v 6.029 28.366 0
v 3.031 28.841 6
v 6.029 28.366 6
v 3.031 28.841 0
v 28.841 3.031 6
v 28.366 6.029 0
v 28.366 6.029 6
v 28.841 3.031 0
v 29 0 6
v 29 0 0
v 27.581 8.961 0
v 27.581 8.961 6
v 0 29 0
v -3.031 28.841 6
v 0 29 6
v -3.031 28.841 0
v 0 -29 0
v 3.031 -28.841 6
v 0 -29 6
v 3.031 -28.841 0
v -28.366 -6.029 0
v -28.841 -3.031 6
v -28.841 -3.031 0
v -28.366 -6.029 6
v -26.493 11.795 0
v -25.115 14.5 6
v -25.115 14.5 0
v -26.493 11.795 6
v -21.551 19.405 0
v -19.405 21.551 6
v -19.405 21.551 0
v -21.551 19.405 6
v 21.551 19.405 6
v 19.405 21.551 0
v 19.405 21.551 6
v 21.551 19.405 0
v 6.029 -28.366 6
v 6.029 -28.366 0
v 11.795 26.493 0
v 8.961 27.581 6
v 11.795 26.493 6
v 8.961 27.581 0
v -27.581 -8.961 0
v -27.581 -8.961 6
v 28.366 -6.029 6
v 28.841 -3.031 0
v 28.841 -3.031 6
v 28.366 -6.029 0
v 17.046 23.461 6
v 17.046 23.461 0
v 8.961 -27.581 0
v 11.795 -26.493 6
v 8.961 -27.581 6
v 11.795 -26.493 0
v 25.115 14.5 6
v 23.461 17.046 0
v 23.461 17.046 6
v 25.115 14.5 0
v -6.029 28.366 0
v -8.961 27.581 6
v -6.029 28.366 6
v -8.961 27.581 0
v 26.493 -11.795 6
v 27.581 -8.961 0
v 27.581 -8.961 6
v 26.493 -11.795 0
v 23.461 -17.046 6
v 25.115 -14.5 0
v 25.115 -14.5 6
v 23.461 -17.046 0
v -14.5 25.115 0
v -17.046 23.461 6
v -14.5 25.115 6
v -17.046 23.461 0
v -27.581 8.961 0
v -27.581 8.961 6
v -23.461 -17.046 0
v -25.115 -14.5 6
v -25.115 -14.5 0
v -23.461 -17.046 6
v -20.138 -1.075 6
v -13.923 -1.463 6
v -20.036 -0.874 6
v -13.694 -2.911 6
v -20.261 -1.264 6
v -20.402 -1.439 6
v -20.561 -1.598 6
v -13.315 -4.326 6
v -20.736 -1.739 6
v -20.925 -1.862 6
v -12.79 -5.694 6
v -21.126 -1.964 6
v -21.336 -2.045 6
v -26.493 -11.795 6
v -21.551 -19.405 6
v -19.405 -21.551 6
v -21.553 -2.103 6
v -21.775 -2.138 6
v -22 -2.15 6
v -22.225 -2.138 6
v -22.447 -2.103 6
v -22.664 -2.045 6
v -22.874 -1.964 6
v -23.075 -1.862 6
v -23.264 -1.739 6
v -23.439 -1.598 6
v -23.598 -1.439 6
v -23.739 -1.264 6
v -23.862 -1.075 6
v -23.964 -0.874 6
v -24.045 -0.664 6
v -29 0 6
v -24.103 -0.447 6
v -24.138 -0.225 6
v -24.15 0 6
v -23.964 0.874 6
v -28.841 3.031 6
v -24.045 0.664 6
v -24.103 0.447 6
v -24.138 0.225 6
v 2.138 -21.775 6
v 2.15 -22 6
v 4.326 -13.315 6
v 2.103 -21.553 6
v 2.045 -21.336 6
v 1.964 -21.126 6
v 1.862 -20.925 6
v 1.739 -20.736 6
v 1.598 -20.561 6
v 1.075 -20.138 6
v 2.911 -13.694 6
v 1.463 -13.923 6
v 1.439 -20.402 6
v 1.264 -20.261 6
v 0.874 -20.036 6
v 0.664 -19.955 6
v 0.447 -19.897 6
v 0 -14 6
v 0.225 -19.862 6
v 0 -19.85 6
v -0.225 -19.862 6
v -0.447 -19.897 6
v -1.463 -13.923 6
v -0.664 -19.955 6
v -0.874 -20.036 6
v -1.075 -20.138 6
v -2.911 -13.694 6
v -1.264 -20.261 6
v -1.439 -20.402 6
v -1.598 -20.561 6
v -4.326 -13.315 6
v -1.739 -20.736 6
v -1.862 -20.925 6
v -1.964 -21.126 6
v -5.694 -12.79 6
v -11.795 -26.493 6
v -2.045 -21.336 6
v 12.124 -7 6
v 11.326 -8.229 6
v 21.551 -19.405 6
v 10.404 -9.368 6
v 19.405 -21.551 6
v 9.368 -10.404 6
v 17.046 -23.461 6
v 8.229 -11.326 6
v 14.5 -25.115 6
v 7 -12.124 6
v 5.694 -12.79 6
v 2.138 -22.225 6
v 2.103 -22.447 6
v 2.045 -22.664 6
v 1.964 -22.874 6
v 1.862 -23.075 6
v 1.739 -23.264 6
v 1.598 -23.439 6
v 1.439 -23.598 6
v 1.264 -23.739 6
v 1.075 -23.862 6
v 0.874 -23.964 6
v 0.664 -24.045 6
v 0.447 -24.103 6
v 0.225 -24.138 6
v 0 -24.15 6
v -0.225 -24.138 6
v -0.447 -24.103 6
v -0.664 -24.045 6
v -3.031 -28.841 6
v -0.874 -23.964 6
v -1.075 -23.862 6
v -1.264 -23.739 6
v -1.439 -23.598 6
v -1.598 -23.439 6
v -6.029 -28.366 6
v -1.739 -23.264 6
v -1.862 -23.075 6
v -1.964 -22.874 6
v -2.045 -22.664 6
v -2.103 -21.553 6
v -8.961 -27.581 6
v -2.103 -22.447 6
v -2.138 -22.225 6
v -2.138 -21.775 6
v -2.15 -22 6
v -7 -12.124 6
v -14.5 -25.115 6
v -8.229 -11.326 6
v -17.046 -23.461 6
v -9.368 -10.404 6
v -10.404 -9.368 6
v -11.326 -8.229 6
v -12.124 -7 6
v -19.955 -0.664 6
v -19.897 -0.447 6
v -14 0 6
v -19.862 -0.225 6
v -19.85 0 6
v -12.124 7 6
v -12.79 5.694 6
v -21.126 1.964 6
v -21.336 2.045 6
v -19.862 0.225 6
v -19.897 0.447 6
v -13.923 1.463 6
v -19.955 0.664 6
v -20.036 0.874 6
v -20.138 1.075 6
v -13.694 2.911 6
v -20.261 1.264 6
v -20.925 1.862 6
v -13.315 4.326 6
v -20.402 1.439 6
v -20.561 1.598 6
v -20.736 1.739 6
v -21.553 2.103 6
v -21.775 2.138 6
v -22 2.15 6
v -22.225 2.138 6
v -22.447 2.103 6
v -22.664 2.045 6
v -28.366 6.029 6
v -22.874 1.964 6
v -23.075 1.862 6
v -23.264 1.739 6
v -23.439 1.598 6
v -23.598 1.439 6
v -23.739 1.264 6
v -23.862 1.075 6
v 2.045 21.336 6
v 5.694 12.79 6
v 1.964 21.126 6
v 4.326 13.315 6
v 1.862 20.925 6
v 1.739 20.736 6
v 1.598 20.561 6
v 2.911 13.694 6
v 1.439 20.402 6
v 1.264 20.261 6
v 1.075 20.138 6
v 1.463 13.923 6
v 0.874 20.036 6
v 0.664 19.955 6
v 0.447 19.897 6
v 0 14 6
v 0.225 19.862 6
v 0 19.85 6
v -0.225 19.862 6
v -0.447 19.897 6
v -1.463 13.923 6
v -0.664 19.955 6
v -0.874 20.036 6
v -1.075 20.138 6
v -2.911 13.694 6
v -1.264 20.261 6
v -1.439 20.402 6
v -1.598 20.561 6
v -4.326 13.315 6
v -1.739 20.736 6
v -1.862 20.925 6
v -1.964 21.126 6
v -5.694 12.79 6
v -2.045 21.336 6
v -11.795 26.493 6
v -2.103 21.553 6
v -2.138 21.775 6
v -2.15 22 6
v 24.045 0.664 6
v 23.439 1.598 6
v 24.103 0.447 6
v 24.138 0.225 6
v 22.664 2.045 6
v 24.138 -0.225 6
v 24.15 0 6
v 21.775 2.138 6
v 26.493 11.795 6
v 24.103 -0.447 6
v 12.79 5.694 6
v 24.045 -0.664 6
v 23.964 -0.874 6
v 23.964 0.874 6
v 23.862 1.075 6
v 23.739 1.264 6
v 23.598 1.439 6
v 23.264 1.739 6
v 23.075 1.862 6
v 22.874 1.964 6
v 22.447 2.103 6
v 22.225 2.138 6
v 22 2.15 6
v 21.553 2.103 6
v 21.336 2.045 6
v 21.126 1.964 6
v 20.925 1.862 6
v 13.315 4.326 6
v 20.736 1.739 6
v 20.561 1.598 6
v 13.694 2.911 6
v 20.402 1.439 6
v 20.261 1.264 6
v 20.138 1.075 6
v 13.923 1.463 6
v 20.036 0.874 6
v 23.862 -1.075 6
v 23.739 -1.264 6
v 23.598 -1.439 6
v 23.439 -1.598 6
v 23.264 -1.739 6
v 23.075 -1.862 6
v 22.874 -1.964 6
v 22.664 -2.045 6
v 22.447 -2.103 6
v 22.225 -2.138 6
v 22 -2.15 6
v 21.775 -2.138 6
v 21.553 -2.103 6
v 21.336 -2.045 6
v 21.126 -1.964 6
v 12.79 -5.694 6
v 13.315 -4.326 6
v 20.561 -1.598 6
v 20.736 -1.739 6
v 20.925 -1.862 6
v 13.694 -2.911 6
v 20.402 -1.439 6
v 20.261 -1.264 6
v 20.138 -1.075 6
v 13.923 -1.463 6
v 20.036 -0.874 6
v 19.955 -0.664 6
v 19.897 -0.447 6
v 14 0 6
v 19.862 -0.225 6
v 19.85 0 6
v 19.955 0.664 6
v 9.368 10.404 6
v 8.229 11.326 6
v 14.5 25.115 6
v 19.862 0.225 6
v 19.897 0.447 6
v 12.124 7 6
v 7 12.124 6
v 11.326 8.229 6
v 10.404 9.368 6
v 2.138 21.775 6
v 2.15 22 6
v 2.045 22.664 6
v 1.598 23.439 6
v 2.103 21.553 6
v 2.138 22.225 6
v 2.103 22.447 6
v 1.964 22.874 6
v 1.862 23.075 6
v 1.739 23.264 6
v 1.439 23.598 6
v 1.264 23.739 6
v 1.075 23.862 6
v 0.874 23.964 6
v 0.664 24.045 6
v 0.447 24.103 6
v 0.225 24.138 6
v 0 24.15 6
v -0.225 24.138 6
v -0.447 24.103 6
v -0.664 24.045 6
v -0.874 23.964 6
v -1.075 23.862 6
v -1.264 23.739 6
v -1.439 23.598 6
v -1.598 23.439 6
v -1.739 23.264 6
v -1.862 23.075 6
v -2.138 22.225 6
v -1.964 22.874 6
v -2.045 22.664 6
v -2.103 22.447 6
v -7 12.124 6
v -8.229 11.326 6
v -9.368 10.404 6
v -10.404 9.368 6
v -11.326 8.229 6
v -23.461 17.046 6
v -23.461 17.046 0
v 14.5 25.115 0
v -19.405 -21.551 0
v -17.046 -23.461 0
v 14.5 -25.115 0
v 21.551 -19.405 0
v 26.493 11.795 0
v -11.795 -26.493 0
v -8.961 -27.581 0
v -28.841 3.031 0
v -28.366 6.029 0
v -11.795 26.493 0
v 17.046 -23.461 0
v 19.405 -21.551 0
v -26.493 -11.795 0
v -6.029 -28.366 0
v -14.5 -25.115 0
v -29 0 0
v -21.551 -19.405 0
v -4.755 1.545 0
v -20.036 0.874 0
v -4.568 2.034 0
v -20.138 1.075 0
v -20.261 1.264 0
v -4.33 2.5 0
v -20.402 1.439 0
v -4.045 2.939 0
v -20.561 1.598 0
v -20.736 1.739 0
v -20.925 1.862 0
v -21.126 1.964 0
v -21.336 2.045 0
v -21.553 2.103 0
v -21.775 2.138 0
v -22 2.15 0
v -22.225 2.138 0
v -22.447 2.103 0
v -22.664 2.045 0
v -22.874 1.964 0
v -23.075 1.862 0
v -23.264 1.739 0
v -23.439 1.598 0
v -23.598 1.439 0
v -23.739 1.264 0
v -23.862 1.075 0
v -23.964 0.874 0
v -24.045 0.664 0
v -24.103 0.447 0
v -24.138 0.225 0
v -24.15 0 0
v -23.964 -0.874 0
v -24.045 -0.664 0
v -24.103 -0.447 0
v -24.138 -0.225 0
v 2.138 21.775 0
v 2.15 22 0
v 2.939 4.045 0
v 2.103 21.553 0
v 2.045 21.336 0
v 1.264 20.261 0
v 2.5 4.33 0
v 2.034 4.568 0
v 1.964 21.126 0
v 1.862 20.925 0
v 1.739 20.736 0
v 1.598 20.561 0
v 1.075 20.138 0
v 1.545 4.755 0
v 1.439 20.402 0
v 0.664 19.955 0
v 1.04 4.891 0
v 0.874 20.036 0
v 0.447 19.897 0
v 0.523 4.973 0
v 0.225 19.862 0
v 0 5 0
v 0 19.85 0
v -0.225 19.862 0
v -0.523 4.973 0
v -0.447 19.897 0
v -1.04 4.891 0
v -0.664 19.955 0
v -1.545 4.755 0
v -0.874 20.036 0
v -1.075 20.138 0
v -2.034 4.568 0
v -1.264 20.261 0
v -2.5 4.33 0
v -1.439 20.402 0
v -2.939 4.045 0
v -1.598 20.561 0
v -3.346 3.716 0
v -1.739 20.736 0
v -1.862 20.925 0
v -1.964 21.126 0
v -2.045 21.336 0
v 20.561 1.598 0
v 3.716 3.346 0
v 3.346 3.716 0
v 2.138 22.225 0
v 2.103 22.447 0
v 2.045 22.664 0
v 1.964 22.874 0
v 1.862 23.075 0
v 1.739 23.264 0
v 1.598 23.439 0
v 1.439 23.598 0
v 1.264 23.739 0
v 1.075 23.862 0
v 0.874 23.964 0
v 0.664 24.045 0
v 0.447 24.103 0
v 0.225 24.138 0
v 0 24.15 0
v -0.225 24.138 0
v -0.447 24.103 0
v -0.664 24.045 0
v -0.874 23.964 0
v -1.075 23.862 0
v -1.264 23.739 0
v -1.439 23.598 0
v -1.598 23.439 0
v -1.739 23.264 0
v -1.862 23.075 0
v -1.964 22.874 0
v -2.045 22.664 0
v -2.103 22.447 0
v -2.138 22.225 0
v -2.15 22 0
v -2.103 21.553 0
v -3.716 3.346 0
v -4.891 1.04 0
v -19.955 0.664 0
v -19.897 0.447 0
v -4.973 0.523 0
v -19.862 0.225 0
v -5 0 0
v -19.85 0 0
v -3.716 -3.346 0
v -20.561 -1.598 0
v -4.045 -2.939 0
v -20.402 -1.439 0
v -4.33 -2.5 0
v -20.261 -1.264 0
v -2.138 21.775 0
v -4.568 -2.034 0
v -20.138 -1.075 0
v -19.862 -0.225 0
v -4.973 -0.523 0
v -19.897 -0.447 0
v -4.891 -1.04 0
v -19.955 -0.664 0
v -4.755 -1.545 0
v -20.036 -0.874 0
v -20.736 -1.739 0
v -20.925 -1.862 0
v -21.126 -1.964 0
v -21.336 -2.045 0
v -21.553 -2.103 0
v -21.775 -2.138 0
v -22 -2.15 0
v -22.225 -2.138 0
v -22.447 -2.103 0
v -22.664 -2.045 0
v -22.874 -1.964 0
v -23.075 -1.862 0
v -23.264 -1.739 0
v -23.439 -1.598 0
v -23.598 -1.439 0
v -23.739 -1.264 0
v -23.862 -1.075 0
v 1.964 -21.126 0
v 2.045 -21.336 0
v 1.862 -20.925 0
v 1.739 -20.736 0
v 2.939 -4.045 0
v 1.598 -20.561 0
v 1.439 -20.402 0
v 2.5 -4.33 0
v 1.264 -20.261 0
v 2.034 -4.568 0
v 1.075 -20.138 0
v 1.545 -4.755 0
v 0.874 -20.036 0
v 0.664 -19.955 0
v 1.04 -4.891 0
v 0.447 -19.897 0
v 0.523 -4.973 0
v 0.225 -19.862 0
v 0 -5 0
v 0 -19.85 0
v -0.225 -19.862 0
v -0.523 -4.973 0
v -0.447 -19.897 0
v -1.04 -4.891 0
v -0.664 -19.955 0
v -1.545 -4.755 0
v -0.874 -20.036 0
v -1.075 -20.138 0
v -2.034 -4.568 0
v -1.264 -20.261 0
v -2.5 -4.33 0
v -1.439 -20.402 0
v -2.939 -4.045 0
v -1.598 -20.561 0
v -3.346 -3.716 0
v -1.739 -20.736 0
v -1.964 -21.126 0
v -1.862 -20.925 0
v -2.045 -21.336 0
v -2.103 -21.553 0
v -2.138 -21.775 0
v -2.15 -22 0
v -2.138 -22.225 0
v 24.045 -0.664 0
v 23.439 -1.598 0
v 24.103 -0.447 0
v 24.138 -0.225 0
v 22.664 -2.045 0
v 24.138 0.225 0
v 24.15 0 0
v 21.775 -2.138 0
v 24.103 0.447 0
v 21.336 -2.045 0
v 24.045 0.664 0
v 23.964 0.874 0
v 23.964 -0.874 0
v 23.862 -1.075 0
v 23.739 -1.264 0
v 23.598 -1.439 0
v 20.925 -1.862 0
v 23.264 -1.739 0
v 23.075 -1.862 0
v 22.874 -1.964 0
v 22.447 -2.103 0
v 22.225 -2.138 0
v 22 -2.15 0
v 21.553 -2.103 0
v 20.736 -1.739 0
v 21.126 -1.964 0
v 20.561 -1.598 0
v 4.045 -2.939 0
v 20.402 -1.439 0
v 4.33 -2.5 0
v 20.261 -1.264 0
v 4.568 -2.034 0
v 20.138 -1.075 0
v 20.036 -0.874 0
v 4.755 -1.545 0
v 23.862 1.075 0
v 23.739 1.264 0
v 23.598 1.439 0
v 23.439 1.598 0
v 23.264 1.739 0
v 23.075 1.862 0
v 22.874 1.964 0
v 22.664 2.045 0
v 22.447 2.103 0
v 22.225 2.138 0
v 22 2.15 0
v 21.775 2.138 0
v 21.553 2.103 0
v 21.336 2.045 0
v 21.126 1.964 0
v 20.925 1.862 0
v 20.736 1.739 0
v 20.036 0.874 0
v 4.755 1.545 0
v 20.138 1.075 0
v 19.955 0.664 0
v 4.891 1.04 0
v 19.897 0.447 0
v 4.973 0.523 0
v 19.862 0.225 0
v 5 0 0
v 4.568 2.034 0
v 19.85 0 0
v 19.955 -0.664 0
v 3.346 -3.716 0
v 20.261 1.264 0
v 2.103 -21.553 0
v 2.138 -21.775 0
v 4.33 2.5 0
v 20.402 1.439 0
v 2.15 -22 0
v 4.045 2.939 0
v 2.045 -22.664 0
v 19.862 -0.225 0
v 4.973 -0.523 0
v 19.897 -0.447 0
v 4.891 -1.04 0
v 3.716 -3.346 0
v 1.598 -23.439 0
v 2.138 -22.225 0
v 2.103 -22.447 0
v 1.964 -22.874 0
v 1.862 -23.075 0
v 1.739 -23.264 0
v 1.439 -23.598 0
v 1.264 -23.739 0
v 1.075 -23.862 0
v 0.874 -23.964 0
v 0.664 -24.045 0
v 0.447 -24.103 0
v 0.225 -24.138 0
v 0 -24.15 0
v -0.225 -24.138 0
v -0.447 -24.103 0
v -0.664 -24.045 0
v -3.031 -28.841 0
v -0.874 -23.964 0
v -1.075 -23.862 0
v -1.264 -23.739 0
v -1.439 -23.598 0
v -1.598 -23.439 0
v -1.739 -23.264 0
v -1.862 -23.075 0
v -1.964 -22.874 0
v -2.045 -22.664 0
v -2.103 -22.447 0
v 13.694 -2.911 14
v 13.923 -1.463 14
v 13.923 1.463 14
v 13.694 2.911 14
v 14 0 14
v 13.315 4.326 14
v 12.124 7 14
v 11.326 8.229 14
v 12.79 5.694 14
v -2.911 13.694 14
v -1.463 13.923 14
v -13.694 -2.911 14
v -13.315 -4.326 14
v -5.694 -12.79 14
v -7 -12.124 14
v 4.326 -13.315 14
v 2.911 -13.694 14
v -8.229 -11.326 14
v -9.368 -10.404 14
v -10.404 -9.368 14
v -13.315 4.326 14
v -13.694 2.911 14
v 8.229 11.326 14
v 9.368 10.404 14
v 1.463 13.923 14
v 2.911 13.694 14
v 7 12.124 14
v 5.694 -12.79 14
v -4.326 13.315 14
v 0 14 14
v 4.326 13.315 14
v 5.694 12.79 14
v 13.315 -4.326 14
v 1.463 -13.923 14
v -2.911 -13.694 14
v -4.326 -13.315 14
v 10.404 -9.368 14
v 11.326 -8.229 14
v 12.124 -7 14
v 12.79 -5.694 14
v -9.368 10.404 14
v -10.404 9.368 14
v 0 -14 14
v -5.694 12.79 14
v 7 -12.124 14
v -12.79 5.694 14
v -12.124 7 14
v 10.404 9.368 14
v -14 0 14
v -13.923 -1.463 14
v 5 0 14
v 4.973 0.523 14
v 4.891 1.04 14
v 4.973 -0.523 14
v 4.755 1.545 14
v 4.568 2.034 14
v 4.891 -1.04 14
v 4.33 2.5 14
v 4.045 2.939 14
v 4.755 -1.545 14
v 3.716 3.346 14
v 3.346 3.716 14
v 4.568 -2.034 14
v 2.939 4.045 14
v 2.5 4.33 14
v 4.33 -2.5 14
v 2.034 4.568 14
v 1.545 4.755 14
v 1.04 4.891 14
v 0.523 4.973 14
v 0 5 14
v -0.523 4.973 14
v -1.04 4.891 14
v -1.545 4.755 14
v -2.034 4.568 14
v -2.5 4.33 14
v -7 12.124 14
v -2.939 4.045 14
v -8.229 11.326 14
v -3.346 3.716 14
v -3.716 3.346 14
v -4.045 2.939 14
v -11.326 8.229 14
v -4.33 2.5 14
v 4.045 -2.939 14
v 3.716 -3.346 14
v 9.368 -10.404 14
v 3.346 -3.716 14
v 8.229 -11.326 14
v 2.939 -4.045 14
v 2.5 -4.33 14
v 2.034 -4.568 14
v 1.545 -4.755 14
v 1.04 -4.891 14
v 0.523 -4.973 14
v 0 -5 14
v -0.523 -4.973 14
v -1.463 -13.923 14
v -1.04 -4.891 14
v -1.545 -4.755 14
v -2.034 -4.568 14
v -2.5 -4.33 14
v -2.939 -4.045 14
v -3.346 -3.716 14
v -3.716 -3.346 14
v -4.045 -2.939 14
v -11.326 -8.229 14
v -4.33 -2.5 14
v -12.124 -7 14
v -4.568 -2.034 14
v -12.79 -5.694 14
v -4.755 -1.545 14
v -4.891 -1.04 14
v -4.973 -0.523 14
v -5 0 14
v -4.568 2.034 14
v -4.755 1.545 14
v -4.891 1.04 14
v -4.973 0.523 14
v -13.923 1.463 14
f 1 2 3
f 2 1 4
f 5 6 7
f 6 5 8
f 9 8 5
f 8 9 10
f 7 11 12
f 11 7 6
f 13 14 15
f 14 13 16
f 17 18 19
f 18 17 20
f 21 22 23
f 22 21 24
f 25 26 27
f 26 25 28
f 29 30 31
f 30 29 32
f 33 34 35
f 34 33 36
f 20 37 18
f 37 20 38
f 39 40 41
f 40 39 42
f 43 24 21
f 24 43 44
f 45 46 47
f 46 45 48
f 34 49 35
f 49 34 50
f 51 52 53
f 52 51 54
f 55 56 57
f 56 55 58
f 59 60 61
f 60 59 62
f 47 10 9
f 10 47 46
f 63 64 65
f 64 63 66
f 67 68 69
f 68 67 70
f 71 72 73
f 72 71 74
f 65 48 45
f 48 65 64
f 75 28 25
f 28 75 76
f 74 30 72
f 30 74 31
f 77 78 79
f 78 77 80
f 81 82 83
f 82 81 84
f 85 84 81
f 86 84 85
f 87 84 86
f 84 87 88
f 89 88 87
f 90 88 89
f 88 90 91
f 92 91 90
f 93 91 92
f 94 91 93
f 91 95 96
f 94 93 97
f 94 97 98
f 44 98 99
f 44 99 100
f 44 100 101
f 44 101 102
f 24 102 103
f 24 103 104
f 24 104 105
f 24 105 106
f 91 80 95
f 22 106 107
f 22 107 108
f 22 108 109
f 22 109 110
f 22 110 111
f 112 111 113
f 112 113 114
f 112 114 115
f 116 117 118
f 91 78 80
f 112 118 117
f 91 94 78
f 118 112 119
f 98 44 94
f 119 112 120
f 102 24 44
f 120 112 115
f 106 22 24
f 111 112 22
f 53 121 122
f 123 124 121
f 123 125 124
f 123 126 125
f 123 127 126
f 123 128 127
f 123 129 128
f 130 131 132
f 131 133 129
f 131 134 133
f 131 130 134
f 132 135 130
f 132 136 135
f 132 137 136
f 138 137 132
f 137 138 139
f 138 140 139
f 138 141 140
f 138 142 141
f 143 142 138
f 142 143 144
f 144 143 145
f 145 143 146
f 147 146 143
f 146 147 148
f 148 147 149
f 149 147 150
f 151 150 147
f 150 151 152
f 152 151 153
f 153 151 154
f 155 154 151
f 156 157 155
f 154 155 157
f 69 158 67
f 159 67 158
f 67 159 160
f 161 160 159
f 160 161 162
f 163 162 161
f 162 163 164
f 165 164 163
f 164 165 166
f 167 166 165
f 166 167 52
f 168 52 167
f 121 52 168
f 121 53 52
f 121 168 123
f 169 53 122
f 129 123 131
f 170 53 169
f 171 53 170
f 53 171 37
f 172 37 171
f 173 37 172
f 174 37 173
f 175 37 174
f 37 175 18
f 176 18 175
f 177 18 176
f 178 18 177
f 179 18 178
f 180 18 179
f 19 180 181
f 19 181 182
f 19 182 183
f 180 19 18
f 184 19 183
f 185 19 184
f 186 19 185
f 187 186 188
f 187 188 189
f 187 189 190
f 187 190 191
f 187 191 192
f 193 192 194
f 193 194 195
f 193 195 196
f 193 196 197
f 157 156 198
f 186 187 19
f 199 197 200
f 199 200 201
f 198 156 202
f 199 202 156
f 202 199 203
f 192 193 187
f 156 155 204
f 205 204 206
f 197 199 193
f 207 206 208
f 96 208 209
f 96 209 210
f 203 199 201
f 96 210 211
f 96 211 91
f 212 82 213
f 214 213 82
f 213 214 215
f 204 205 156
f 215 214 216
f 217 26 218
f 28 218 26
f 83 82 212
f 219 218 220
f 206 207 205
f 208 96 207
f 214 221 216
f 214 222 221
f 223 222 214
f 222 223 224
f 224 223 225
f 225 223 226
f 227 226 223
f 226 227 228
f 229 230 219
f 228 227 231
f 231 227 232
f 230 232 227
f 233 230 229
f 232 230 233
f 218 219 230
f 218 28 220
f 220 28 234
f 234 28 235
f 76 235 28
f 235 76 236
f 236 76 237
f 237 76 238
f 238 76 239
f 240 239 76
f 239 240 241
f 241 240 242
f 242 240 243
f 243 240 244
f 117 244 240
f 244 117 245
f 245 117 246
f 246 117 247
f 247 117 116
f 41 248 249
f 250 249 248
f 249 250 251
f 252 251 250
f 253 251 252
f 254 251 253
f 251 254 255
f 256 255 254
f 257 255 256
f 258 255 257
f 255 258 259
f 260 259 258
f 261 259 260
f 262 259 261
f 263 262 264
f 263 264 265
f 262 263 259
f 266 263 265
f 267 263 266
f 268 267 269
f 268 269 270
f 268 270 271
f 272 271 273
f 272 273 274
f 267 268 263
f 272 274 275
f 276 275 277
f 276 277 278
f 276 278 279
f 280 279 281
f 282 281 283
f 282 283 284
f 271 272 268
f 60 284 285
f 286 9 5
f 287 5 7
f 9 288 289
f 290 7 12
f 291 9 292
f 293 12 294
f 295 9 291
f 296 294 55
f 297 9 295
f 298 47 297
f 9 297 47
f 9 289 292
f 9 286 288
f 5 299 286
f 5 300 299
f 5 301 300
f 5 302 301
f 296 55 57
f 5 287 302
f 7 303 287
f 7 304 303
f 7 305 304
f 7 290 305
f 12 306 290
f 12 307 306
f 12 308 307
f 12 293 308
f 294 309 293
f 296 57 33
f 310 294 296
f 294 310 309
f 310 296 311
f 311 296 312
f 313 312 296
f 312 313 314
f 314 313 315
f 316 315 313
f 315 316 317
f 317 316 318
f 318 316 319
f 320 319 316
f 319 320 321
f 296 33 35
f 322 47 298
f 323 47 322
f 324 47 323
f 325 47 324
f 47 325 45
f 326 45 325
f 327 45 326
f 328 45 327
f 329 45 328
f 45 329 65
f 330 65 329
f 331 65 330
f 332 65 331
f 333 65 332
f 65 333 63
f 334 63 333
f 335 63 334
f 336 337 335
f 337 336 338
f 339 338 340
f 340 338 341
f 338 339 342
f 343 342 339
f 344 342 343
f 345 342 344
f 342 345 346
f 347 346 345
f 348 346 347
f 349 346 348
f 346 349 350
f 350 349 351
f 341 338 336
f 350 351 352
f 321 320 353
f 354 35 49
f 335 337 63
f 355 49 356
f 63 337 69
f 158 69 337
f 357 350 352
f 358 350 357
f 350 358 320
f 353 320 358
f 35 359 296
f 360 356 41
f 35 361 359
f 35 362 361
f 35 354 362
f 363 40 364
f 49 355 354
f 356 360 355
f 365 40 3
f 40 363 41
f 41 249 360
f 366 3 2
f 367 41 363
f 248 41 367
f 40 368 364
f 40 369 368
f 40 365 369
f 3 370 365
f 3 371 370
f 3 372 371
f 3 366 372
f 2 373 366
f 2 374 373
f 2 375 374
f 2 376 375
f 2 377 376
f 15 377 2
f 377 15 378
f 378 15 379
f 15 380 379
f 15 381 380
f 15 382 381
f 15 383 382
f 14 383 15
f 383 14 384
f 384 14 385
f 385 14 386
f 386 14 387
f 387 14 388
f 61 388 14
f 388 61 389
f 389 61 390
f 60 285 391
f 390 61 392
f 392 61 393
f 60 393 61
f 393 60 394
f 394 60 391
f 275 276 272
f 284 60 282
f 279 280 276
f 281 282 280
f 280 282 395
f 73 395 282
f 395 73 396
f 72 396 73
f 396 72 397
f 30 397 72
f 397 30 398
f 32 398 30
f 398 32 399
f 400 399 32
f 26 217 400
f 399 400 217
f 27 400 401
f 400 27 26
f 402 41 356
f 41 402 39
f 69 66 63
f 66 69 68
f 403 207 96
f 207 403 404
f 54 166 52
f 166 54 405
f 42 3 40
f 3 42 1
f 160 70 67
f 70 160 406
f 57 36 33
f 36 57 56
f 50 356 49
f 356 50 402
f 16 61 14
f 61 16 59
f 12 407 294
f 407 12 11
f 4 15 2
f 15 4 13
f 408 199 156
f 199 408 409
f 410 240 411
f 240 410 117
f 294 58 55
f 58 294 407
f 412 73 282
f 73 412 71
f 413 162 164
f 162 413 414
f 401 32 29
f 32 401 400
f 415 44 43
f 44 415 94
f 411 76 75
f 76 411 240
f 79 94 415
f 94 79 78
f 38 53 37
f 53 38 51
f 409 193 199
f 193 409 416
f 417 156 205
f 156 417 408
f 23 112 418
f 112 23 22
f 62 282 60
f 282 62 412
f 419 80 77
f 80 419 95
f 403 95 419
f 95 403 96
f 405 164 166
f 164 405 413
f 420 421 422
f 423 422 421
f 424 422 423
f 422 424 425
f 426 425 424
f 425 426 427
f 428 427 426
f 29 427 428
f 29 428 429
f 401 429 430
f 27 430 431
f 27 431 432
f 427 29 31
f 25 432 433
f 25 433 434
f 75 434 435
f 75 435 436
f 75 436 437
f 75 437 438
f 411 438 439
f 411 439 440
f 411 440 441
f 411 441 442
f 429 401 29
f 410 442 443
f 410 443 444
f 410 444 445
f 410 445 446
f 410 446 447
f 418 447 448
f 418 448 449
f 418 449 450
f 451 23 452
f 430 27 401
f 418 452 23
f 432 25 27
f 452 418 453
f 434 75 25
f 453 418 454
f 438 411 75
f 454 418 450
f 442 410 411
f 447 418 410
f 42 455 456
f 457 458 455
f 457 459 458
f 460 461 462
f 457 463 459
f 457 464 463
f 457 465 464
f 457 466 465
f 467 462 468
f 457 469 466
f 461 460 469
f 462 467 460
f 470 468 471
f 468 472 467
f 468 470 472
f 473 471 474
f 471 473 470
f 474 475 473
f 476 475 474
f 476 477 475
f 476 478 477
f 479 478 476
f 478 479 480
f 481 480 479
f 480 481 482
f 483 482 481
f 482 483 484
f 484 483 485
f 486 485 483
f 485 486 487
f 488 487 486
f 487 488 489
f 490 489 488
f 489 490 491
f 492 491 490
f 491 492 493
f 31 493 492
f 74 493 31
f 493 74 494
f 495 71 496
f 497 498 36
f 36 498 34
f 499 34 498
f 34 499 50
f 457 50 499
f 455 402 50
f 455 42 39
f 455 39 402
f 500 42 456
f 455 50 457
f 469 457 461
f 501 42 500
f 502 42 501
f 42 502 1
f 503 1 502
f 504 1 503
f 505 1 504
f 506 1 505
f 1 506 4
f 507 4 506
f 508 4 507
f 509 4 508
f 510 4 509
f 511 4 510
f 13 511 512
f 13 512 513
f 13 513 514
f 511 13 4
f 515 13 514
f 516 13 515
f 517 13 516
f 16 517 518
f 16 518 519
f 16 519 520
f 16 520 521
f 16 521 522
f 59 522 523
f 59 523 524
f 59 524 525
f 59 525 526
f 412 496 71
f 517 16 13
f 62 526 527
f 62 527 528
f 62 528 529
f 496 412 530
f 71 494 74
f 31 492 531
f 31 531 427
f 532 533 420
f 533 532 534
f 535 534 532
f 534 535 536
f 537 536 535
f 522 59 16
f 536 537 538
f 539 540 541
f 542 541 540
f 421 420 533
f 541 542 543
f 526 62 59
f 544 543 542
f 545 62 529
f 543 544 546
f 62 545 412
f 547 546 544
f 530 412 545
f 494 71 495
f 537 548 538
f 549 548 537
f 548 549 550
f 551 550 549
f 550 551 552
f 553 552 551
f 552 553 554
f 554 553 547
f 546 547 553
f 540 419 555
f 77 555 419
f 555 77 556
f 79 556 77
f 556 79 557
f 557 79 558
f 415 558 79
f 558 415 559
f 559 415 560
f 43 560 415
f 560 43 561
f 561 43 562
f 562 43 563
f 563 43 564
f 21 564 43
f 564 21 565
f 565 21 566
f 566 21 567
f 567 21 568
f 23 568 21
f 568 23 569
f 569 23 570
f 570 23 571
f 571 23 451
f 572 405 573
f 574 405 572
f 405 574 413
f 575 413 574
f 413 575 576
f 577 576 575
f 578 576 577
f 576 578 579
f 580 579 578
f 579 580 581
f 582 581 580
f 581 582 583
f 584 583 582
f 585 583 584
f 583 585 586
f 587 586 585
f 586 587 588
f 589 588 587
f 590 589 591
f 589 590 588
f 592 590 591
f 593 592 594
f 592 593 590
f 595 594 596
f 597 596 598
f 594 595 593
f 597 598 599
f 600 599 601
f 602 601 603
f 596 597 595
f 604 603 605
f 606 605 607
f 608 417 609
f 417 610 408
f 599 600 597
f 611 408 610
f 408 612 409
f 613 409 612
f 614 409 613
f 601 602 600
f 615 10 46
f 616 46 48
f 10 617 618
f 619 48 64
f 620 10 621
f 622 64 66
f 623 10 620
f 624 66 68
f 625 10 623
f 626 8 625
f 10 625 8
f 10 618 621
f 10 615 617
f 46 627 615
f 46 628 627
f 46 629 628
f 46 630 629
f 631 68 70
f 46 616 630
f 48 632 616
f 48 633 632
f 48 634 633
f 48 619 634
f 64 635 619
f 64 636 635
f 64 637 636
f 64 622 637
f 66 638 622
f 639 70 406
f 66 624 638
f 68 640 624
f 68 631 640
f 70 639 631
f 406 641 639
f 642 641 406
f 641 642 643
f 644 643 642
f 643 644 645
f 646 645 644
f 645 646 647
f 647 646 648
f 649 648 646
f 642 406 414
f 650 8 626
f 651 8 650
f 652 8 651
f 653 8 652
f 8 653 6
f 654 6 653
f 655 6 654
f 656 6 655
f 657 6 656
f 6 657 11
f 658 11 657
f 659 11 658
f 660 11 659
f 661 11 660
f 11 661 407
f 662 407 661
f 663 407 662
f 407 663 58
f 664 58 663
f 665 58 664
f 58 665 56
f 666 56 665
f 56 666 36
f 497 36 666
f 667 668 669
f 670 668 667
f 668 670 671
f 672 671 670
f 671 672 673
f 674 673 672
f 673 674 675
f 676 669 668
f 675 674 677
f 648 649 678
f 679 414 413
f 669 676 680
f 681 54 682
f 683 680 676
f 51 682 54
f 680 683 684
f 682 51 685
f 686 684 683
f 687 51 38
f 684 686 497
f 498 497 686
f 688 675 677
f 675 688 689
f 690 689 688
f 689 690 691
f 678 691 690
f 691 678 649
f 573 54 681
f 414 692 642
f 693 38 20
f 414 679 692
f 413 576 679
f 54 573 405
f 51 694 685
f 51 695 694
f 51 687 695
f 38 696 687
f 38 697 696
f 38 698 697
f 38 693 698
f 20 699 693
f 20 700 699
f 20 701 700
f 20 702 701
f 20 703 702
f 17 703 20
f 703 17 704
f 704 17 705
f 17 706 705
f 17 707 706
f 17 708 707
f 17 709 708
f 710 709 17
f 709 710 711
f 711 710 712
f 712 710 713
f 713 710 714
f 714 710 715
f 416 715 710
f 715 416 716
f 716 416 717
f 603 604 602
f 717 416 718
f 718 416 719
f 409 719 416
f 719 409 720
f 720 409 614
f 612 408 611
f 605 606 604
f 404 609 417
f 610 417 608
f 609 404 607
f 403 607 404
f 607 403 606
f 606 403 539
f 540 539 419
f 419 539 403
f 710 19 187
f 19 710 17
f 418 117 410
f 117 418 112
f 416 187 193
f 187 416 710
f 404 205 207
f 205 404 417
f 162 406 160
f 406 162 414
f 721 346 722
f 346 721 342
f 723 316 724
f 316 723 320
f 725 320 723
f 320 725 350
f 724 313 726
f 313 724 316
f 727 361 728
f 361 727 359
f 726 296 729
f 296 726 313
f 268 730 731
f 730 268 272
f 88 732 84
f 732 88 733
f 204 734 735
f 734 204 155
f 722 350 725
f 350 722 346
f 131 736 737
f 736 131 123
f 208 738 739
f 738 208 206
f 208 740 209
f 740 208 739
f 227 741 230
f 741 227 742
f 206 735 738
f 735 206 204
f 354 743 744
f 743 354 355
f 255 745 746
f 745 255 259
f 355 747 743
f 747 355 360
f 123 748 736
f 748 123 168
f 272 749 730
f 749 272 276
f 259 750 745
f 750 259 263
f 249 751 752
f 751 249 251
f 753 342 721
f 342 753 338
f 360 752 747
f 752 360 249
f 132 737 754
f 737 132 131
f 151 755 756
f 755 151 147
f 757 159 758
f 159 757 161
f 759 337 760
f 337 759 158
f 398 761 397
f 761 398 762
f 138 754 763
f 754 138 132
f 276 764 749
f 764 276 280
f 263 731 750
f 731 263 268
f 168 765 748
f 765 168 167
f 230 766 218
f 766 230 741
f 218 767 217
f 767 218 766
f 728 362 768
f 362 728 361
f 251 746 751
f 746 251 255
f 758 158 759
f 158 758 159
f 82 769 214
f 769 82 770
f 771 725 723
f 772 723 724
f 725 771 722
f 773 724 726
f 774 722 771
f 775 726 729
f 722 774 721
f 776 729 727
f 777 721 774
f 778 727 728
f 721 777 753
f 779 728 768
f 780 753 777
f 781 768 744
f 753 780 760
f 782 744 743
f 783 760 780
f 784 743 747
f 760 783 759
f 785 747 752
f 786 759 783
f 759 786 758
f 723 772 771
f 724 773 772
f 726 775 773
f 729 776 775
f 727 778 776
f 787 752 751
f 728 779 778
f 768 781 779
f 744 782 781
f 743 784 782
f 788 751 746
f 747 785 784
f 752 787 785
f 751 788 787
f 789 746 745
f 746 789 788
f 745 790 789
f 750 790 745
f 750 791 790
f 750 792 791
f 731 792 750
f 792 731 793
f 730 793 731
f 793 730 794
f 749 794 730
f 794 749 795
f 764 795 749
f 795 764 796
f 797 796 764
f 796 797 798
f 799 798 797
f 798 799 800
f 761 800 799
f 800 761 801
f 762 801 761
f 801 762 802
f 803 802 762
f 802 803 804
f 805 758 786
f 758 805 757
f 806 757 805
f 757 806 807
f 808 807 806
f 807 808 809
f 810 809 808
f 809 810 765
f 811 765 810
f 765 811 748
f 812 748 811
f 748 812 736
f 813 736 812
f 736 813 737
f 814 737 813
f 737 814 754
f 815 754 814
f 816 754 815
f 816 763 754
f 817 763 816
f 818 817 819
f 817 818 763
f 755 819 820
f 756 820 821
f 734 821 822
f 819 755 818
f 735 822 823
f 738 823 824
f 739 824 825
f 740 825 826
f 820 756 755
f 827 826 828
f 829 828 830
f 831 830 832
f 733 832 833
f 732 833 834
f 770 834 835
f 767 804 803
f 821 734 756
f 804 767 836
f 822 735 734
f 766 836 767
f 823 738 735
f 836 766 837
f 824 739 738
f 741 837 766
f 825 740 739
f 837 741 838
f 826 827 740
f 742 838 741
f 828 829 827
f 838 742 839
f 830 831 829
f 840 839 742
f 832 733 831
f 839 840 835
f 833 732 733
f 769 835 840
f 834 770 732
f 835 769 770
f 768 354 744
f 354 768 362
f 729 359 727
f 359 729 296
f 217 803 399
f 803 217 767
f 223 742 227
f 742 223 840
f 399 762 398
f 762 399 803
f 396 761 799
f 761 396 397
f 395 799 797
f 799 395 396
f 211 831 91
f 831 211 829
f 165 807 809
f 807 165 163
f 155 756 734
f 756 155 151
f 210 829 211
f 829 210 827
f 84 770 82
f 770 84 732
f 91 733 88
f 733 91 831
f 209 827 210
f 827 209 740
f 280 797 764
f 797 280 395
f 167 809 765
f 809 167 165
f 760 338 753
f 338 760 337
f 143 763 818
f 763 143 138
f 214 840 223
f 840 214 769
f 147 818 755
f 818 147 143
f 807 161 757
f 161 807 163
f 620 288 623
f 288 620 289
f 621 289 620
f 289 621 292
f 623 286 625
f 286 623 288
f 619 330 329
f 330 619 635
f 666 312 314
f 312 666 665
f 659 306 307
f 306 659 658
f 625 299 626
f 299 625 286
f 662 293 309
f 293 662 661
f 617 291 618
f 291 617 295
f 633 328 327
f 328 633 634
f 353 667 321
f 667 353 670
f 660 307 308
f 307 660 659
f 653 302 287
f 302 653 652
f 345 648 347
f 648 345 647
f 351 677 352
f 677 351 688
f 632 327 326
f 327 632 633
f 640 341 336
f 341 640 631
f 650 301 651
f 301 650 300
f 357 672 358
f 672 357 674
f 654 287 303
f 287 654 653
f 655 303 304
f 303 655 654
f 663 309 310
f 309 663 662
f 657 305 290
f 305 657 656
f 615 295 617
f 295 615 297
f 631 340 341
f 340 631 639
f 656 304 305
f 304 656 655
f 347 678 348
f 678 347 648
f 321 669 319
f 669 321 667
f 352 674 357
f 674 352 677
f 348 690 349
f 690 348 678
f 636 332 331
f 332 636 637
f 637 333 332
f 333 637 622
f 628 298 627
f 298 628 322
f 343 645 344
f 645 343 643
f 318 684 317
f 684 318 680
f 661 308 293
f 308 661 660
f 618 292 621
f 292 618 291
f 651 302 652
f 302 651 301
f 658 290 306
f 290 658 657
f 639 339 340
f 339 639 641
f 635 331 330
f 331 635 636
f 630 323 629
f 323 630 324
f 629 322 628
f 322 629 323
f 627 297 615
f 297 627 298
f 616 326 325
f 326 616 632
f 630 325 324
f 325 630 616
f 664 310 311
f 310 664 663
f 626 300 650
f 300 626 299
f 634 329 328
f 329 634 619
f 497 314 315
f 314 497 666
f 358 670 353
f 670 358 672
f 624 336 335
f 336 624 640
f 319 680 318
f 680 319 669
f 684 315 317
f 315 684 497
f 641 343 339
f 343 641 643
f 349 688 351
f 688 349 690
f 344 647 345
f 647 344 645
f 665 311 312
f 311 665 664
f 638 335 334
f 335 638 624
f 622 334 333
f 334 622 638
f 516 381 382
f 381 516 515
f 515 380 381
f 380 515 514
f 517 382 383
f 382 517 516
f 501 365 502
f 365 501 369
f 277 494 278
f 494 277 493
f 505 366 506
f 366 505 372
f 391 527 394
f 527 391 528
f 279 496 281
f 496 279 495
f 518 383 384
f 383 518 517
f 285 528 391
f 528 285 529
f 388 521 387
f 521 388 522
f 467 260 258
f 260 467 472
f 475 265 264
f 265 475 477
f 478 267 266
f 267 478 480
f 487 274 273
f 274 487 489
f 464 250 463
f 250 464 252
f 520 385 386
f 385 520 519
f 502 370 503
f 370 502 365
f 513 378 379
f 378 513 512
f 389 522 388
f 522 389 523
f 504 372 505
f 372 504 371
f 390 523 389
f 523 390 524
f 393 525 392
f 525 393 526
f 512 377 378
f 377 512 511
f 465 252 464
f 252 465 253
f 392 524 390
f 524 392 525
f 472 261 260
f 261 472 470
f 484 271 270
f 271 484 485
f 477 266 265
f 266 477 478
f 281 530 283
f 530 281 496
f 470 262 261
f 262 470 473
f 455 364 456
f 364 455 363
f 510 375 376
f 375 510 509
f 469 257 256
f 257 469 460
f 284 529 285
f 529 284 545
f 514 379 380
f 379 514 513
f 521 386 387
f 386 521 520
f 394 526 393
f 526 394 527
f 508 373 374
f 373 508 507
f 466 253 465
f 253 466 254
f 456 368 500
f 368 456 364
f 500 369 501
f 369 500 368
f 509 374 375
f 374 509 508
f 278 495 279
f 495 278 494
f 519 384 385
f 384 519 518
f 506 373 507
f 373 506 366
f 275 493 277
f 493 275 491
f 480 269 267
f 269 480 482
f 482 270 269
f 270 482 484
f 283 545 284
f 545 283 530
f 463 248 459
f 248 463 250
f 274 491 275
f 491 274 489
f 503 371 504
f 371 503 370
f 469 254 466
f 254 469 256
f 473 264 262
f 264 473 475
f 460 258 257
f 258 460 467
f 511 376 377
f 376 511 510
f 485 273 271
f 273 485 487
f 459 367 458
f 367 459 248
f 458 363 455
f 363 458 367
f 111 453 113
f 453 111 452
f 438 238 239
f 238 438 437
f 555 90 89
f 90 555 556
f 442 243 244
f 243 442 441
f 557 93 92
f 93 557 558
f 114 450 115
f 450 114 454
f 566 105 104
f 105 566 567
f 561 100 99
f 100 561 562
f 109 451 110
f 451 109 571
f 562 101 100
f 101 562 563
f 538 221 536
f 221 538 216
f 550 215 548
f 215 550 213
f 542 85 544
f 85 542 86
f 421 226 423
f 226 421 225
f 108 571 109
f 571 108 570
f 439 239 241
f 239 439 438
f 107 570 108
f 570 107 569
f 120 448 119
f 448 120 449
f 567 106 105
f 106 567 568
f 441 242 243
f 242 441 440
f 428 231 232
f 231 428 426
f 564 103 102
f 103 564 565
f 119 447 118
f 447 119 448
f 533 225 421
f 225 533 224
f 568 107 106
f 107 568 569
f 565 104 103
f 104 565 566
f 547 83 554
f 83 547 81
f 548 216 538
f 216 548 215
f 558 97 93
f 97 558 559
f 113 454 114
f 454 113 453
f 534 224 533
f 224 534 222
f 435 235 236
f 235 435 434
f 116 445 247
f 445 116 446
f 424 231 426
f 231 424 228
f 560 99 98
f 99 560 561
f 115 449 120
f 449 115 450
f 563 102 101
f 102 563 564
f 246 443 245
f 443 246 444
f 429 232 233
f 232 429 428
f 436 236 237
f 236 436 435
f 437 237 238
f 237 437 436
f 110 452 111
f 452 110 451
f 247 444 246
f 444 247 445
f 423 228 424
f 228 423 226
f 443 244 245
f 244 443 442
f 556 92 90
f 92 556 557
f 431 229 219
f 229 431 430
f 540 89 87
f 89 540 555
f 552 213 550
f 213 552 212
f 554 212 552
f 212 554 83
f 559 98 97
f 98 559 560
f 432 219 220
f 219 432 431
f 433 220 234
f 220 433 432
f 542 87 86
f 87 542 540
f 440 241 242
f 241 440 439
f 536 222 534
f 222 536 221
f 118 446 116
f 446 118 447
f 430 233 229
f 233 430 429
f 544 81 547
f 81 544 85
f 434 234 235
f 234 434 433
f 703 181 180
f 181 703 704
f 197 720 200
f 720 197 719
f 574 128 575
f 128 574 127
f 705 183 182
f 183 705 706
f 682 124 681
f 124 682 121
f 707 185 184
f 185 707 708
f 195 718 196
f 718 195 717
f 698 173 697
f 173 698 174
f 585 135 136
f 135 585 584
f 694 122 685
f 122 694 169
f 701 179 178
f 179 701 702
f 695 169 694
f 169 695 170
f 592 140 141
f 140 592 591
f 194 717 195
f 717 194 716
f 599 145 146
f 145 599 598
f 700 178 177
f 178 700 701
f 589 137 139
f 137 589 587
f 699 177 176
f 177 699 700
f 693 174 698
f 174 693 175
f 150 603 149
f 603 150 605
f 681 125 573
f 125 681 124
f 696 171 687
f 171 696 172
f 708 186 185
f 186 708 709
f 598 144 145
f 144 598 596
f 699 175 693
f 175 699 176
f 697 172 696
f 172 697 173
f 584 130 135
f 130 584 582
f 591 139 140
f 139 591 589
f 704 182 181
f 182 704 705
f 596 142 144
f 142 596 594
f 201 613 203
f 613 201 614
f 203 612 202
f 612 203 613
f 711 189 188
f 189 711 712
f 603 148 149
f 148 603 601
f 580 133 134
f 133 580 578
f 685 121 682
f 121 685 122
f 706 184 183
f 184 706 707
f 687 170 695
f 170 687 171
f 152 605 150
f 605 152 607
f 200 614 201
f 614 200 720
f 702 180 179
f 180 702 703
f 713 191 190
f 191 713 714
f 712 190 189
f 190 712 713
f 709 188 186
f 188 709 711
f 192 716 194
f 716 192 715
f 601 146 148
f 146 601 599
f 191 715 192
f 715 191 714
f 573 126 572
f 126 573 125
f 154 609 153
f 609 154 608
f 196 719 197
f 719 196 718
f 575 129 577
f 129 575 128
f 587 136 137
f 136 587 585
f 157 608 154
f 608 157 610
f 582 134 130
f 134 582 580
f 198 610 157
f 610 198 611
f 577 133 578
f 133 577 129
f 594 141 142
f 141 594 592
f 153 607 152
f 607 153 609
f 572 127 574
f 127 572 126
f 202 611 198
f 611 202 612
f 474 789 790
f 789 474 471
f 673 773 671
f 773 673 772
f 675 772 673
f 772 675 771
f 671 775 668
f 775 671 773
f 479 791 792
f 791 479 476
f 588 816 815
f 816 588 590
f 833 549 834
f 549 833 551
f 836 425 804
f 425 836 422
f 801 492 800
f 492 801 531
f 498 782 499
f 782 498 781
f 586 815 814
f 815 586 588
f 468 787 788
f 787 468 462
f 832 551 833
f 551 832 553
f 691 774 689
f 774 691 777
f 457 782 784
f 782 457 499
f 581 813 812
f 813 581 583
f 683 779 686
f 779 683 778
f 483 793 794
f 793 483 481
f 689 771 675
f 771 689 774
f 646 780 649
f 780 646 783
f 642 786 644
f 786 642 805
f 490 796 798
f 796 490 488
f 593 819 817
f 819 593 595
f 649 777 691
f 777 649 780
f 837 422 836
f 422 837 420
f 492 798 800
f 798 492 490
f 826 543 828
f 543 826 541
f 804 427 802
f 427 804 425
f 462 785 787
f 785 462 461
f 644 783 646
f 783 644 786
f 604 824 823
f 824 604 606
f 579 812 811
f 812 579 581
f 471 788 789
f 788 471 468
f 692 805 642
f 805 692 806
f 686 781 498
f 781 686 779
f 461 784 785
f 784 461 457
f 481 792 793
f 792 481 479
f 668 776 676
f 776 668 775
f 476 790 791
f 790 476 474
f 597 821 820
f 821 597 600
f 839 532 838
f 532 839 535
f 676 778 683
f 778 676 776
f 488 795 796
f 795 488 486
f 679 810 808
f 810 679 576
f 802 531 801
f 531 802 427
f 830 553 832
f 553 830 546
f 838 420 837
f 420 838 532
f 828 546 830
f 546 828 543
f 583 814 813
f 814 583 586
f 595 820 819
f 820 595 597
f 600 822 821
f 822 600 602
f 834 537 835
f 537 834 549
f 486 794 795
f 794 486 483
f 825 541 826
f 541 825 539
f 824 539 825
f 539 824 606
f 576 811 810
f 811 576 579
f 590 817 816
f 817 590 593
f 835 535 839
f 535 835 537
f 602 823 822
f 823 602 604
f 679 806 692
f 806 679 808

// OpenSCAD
// 4-bolt mounting flange, 58 mm OD.
$fn = 60;
eps = 0.02;
flange_d = 58;
flange_t = 6;
hub_d = 28;
hub_h = 14;
center_d = 10;
bolt_circle_d = 44;
bolt_d = 4.3;
difference() {
    union() { cylinder(d = flange_d, h = flange_t); cylinder(d = hub_d, h = hub_h); }
    translate([0, 0, -eps]) cylinder(d = center_d, h = hub_h + 2 * eps);
    for (i = [0 : 3]) rotate([0, 0, i * 360 / 4])
        translate([bolt_circle_d / 2, 0, -eps]) cylinder(d = bolt_d, h = flange_t + 2 * eps);
}
